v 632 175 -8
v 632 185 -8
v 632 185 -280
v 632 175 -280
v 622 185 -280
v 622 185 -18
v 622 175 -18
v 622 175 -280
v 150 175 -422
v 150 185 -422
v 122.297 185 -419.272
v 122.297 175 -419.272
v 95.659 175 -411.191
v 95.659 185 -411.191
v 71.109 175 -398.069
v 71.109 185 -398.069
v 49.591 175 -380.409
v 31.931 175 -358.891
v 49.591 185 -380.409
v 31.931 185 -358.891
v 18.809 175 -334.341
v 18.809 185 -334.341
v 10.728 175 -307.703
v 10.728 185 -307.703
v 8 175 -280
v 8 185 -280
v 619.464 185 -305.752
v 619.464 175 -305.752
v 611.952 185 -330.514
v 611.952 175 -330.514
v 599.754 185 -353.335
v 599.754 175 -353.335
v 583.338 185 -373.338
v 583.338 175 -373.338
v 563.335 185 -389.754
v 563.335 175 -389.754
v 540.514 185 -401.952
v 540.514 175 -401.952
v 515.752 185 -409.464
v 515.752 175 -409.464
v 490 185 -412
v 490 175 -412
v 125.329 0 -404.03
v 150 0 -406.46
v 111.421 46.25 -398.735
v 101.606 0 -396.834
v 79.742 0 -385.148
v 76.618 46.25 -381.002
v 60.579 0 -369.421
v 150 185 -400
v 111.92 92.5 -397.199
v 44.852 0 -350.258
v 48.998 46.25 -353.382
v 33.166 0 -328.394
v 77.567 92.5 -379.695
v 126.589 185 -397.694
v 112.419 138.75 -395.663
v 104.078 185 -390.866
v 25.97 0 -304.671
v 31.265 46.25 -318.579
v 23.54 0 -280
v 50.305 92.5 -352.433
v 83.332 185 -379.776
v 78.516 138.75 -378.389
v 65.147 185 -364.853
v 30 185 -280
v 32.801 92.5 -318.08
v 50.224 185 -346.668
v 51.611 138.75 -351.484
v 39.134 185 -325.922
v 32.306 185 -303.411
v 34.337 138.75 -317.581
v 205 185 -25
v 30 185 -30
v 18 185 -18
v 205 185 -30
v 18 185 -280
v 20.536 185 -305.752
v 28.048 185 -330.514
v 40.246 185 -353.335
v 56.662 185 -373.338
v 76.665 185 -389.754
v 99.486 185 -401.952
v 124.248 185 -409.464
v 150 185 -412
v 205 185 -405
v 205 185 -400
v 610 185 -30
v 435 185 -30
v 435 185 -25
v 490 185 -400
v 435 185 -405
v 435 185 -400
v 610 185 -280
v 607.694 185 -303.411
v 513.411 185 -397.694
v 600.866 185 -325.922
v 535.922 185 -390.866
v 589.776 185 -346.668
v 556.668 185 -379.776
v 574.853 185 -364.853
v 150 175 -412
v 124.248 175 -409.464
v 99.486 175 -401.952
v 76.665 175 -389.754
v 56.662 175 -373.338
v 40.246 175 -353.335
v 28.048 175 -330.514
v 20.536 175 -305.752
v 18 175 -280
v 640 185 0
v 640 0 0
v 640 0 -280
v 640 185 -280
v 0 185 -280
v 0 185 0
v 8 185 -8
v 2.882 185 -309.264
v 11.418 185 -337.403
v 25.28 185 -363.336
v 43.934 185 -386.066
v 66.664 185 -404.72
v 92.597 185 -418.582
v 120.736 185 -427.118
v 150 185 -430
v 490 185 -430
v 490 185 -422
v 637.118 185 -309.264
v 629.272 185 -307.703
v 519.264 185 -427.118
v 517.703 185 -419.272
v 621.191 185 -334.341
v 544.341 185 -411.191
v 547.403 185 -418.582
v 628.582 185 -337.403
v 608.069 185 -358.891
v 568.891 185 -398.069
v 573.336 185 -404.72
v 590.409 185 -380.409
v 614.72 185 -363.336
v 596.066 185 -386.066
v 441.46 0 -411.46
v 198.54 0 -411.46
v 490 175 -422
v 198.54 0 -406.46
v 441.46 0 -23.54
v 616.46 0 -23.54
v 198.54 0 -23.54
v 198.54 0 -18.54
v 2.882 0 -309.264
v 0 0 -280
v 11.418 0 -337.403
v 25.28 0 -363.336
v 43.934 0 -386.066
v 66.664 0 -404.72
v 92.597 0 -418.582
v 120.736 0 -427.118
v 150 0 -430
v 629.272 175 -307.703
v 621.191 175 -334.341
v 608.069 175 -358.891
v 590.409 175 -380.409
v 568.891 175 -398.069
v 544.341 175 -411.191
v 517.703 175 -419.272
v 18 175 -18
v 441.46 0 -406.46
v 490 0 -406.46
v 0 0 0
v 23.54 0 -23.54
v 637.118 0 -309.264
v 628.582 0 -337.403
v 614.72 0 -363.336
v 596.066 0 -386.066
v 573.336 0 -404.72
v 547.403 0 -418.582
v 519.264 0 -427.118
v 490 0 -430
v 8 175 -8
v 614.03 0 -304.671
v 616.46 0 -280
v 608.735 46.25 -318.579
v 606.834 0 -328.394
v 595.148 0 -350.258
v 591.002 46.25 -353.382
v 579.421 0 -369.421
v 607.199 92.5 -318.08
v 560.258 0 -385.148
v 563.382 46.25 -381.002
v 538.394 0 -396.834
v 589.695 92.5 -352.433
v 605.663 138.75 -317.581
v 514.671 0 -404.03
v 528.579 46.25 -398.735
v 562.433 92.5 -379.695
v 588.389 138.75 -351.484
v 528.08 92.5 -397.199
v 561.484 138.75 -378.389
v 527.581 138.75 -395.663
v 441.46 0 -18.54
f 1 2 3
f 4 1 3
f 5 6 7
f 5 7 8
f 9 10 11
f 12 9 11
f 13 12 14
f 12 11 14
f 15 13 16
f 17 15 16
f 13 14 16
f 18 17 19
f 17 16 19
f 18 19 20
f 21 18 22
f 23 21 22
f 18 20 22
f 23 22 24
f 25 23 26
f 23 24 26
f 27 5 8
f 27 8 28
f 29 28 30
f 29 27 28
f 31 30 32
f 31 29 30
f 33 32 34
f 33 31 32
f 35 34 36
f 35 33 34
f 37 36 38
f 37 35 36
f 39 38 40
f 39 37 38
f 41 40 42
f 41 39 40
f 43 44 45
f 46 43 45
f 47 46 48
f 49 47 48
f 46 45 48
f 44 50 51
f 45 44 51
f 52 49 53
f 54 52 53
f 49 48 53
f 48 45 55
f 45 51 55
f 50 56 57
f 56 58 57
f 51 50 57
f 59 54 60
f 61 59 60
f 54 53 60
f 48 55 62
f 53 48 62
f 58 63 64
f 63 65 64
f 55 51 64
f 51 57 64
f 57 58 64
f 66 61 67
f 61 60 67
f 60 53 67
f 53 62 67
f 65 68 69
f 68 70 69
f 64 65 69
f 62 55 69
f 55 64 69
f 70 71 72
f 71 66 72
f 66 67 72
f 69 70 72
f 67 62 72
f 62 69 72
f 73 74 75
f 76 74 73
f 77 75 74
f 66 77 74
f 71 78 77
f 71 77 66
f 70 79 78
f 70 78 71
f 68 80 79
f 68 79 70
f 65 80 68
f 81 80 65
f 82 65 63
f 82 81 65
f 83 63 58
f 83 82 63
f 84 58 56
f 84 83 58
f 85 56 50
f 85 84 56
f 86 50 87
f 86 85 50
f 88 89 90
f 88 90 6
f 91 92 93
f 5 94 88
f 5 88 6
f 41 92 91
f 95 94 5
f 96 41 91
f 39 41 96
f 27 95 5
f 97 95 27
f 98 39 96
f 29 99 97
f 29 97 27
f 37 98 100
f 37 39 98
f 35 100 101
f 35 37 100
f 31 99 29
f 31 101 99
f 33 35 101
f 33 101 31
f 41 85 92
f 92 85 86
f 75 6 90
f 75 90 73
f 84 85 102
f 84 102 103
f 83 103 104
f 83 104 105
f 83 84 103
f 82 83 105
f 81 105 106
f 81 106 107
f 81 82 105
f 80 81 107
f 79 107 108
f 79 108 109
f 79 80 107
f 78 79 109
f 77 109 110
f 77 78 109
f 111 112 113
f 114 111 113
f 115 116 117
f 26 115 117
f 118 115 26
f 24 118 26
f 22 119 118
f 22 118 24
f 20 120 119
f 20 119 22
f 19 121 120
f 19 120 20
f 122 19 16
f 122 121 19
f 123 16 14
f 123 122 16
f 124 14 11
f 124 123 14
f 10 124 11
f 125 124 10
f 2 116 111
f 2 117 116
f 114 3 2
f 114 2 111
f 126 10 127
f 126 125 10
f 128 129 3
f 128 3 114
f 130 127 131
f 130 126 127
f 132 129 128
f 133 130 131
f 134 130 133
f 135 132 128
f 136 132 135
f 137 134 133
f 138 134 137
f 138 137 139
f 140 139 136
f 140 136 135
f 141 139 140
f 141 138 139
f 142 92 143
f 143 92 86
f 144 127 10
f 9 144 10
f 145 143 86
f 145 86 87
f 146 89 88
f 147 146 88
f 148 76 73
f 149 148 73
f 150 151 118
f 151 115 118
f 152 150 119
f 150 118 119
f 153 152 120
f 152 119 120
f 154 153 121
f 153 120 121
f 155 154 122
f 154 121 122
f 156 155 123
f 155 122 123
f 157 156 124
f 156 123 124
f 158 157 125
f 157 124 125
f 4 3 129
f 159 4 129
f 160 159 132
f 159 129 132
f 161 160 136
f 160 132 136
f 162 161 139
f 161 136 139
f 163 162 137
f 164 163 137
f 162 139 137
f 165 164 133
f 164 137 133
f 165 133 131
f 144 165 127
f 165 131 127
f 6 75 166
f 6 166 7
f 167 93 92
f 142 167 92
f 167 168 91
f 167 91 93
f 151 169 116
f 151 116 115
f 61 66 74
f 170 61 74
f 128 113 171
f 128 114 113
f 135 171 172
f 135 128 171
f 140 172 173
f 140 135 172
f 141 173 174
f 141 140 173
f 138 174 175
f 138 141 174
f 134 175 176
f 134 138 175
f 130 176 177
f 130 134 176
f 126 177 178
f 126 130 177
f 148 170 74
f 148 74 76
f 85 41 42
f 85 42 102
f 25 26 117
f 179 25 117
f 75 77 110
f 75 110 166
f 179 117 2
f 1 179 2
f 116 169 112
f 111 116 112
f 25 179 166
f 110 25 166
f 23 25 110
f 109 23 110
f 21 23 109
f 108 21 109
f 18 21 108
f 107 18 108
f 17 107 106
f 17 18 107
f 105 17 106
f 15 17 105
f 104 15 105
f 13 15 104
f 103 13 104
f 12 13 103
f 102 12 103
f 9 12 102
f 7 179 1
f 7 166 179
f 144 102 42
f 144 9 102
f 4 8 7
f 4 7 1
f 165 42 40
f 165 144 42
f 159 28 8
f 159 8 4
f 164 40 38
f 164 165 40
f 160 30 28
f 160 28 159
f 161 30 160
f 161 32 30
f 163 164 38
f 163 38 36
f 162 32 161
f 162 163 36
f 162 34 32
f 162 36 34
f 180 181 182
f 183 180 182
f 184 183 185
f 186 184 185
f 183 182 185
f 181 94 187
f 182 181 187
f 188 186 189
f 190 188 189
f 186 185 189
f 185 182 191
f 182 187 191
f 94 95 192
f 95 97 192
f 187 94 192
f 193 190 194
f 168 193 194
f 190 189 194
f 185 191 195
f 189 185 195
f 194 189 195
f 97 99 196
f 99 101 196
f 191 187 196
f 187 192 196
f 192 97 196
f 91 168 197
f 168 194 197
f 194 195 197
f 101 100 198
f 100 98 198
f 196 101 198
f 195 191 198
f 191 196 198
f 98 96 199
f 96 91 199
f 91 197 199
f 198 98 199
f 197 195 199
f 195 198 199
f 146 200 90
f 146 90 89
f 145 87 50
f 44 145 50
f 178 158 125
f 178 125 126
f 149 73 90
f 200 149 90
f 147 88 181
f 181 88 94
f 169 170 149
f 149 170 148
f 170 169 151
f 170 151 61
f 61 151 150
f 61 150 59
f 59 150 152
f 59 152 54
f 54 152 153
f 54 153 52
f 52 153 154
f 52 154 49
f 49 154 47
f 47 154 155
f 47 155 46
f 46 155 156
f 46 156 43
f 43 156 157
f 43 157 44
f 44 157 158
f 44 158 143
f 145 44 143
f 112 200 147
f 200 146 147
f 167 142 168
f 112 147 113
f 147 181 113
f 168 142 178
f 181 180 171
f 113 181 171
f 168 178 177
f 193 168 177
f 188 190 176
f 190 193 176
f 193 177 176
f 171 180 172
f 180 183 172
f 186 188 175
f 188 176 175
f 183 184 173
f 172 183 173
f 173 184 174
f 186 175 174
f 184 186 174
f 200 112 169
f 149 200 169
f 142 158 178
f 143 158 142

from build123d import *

# Parameters (mm, degrees)
SKIZZE1_W                            = 640
SKIZZE1_H                            = 430
AUFSATZ_LINEAR_AUSTRAGEN1_DEPTH      = 185
VERRUNDUNG1_R                        = 150
SCHNITT_LINEAR_AUSTRAGEN1_DEPTH      = 186
SCHNITT_LINEAR_AUSTRAGEN1_DRAFT      = 2
SCHNITT_LINEAR_AUSTRAGEN_D_NN1_DEPTH = 10


with BuildPart() as part:
    # Skizze1 → Aufsatz-Linear austragen1 (new body)
    with BuildSketch(Plane(origin=(0, 0, 0), x_dir=(1, 0, 0), z_dir=(0, 1, 0))):
        with Locations((320, 215)):
            Rectangle(SKIZZE1_W, SKIZZE1_H)
    extrude(amount=AUFSATZ_LINEAR_AUSTRAGEN1_DEPTH)

    # Verrundung1
    verrundung1_edges = [part.edges().sort_by_distance(p)[0] for p in [
        (0, 92.5, -430),
        (640, 92.5, -430),
    ]]
    fillet(verrundung1_edges, radius=VERRUNDUNG1_R)


with BuildPart() as schnitt_linear_austragen1_tool:
    # Skizze2 → Schnitt-Linear austragen1 (with draft: the straight prism first)
    with BuildSketch(Plane(origin=(0, 185, 0), x_dir=(1, 0, 0), z_dir=(0, 1, 0))):
        with BuildLine():
            Line((490, 400), (435, 400))
            Line((435, 400), (435, 405))
            Line((435, 405), (205, 405))
            Line((205, 405), (205, 400))
            Line((205, 400), (150, 400))
            ThreePointArc((150, 400), (65.147186258, 364.852813742), (30, 280))
            Line((30, 280), (30, 30))
            Line((30, 30), (205, 30))
            Line((205, 30), (205, 25))
            Line((205, 25), (435, 25))
            Line((435, 25), (435, 30))
            Line((435, 30), (610, 30))
            Line((610, 30), (610, 280))
            ThreePointArc((610, 280), (574.852813742, 364.852813742), (490, 400))
        make_face()
    extrude(amount=-SCHNITT_LINEAR_AUSTRAGEN1_DEPTH)
    # Schnitt-Linear austragen1: the draft: its side faces are tilted about the plane it starts from
    schnitt_linear_austragen1_sides = [schnitt_linear_austragen1_tool.faces().sort_by_distance(p)[0] for p in [
        (462.5, 92, -400),
        (435, 92, -402.5),
        (320, 92, -405),
        (205, 92, -402.5),
        (177.5, 92, -400),
        (65.147186258, 92, -364.852813742),
        (30, 92, -155),
        (117.5, 92, -30),
        (205, 92, -27.5),
        (320, 92, -25),
        (435, 92, -27.5),
        (522.5, 92, -30),
        (610, 92, -155),
        (574.852813742, 92, -364.852813742),
    ]]
    draft(schnitt_linear_austragen1_sides, Plane(origin=(0, 185, 0), x_dir=(1, 0, 0), z_dir=(0, 1, 0)), SCHNITT_LINEAR_AUSTRAGEN1_DRAFT)


with BuildPart() as part_1:
    add(part.part)

    # Schnitt-Linear austragen1: cut by schnitt_linear_austragen1_tool
    add(schnitt_linear_austragen1_tool.part, mode=Mode.SUBTRACT)

    # Skizze3 → Schnitt-Linear-Austragen-Dünn1 (cut)
    with BuildSketch(Plane(origin=(0, 185, 0), x_dir=(1, 0, 0), z_dir=(0, 1, 0))):
        with BuildLine():
            Line((490, 422), (150, 422))
            ThreePointArc((150, 422), (49.590837072, 380.409162928), (8, 280))
            Line((8, 280), (8, 8))
            Line((8, 8), (632, 8))
            Line((632, 8), (632, 280))
            ThreePointArc((632, 280), (590.409162928, 380.409162928), (490, 422))
        make_face()
        with BuildLine():
            Line((490, 412), (150, 412))
            ThreePointArc((150, 412), (56.661904883, 373.338095117), (18, 280))
            Line((18, 280), (18, 18))
            Line((18, 18), (622, 18))
            Line((622, 18), (622, 280))
            ThreePointArc((622, 280), (583.338095117, 373.338095117), (490, 412))
        make_face(mode=Mode.SUBTRACT)
    extrude(amount=-SCHNITT_LINEAR_AUSTRAGEN_D_NN1_DEPTH, mode=Mode.SUBTRACT)


solid = part_1.part
